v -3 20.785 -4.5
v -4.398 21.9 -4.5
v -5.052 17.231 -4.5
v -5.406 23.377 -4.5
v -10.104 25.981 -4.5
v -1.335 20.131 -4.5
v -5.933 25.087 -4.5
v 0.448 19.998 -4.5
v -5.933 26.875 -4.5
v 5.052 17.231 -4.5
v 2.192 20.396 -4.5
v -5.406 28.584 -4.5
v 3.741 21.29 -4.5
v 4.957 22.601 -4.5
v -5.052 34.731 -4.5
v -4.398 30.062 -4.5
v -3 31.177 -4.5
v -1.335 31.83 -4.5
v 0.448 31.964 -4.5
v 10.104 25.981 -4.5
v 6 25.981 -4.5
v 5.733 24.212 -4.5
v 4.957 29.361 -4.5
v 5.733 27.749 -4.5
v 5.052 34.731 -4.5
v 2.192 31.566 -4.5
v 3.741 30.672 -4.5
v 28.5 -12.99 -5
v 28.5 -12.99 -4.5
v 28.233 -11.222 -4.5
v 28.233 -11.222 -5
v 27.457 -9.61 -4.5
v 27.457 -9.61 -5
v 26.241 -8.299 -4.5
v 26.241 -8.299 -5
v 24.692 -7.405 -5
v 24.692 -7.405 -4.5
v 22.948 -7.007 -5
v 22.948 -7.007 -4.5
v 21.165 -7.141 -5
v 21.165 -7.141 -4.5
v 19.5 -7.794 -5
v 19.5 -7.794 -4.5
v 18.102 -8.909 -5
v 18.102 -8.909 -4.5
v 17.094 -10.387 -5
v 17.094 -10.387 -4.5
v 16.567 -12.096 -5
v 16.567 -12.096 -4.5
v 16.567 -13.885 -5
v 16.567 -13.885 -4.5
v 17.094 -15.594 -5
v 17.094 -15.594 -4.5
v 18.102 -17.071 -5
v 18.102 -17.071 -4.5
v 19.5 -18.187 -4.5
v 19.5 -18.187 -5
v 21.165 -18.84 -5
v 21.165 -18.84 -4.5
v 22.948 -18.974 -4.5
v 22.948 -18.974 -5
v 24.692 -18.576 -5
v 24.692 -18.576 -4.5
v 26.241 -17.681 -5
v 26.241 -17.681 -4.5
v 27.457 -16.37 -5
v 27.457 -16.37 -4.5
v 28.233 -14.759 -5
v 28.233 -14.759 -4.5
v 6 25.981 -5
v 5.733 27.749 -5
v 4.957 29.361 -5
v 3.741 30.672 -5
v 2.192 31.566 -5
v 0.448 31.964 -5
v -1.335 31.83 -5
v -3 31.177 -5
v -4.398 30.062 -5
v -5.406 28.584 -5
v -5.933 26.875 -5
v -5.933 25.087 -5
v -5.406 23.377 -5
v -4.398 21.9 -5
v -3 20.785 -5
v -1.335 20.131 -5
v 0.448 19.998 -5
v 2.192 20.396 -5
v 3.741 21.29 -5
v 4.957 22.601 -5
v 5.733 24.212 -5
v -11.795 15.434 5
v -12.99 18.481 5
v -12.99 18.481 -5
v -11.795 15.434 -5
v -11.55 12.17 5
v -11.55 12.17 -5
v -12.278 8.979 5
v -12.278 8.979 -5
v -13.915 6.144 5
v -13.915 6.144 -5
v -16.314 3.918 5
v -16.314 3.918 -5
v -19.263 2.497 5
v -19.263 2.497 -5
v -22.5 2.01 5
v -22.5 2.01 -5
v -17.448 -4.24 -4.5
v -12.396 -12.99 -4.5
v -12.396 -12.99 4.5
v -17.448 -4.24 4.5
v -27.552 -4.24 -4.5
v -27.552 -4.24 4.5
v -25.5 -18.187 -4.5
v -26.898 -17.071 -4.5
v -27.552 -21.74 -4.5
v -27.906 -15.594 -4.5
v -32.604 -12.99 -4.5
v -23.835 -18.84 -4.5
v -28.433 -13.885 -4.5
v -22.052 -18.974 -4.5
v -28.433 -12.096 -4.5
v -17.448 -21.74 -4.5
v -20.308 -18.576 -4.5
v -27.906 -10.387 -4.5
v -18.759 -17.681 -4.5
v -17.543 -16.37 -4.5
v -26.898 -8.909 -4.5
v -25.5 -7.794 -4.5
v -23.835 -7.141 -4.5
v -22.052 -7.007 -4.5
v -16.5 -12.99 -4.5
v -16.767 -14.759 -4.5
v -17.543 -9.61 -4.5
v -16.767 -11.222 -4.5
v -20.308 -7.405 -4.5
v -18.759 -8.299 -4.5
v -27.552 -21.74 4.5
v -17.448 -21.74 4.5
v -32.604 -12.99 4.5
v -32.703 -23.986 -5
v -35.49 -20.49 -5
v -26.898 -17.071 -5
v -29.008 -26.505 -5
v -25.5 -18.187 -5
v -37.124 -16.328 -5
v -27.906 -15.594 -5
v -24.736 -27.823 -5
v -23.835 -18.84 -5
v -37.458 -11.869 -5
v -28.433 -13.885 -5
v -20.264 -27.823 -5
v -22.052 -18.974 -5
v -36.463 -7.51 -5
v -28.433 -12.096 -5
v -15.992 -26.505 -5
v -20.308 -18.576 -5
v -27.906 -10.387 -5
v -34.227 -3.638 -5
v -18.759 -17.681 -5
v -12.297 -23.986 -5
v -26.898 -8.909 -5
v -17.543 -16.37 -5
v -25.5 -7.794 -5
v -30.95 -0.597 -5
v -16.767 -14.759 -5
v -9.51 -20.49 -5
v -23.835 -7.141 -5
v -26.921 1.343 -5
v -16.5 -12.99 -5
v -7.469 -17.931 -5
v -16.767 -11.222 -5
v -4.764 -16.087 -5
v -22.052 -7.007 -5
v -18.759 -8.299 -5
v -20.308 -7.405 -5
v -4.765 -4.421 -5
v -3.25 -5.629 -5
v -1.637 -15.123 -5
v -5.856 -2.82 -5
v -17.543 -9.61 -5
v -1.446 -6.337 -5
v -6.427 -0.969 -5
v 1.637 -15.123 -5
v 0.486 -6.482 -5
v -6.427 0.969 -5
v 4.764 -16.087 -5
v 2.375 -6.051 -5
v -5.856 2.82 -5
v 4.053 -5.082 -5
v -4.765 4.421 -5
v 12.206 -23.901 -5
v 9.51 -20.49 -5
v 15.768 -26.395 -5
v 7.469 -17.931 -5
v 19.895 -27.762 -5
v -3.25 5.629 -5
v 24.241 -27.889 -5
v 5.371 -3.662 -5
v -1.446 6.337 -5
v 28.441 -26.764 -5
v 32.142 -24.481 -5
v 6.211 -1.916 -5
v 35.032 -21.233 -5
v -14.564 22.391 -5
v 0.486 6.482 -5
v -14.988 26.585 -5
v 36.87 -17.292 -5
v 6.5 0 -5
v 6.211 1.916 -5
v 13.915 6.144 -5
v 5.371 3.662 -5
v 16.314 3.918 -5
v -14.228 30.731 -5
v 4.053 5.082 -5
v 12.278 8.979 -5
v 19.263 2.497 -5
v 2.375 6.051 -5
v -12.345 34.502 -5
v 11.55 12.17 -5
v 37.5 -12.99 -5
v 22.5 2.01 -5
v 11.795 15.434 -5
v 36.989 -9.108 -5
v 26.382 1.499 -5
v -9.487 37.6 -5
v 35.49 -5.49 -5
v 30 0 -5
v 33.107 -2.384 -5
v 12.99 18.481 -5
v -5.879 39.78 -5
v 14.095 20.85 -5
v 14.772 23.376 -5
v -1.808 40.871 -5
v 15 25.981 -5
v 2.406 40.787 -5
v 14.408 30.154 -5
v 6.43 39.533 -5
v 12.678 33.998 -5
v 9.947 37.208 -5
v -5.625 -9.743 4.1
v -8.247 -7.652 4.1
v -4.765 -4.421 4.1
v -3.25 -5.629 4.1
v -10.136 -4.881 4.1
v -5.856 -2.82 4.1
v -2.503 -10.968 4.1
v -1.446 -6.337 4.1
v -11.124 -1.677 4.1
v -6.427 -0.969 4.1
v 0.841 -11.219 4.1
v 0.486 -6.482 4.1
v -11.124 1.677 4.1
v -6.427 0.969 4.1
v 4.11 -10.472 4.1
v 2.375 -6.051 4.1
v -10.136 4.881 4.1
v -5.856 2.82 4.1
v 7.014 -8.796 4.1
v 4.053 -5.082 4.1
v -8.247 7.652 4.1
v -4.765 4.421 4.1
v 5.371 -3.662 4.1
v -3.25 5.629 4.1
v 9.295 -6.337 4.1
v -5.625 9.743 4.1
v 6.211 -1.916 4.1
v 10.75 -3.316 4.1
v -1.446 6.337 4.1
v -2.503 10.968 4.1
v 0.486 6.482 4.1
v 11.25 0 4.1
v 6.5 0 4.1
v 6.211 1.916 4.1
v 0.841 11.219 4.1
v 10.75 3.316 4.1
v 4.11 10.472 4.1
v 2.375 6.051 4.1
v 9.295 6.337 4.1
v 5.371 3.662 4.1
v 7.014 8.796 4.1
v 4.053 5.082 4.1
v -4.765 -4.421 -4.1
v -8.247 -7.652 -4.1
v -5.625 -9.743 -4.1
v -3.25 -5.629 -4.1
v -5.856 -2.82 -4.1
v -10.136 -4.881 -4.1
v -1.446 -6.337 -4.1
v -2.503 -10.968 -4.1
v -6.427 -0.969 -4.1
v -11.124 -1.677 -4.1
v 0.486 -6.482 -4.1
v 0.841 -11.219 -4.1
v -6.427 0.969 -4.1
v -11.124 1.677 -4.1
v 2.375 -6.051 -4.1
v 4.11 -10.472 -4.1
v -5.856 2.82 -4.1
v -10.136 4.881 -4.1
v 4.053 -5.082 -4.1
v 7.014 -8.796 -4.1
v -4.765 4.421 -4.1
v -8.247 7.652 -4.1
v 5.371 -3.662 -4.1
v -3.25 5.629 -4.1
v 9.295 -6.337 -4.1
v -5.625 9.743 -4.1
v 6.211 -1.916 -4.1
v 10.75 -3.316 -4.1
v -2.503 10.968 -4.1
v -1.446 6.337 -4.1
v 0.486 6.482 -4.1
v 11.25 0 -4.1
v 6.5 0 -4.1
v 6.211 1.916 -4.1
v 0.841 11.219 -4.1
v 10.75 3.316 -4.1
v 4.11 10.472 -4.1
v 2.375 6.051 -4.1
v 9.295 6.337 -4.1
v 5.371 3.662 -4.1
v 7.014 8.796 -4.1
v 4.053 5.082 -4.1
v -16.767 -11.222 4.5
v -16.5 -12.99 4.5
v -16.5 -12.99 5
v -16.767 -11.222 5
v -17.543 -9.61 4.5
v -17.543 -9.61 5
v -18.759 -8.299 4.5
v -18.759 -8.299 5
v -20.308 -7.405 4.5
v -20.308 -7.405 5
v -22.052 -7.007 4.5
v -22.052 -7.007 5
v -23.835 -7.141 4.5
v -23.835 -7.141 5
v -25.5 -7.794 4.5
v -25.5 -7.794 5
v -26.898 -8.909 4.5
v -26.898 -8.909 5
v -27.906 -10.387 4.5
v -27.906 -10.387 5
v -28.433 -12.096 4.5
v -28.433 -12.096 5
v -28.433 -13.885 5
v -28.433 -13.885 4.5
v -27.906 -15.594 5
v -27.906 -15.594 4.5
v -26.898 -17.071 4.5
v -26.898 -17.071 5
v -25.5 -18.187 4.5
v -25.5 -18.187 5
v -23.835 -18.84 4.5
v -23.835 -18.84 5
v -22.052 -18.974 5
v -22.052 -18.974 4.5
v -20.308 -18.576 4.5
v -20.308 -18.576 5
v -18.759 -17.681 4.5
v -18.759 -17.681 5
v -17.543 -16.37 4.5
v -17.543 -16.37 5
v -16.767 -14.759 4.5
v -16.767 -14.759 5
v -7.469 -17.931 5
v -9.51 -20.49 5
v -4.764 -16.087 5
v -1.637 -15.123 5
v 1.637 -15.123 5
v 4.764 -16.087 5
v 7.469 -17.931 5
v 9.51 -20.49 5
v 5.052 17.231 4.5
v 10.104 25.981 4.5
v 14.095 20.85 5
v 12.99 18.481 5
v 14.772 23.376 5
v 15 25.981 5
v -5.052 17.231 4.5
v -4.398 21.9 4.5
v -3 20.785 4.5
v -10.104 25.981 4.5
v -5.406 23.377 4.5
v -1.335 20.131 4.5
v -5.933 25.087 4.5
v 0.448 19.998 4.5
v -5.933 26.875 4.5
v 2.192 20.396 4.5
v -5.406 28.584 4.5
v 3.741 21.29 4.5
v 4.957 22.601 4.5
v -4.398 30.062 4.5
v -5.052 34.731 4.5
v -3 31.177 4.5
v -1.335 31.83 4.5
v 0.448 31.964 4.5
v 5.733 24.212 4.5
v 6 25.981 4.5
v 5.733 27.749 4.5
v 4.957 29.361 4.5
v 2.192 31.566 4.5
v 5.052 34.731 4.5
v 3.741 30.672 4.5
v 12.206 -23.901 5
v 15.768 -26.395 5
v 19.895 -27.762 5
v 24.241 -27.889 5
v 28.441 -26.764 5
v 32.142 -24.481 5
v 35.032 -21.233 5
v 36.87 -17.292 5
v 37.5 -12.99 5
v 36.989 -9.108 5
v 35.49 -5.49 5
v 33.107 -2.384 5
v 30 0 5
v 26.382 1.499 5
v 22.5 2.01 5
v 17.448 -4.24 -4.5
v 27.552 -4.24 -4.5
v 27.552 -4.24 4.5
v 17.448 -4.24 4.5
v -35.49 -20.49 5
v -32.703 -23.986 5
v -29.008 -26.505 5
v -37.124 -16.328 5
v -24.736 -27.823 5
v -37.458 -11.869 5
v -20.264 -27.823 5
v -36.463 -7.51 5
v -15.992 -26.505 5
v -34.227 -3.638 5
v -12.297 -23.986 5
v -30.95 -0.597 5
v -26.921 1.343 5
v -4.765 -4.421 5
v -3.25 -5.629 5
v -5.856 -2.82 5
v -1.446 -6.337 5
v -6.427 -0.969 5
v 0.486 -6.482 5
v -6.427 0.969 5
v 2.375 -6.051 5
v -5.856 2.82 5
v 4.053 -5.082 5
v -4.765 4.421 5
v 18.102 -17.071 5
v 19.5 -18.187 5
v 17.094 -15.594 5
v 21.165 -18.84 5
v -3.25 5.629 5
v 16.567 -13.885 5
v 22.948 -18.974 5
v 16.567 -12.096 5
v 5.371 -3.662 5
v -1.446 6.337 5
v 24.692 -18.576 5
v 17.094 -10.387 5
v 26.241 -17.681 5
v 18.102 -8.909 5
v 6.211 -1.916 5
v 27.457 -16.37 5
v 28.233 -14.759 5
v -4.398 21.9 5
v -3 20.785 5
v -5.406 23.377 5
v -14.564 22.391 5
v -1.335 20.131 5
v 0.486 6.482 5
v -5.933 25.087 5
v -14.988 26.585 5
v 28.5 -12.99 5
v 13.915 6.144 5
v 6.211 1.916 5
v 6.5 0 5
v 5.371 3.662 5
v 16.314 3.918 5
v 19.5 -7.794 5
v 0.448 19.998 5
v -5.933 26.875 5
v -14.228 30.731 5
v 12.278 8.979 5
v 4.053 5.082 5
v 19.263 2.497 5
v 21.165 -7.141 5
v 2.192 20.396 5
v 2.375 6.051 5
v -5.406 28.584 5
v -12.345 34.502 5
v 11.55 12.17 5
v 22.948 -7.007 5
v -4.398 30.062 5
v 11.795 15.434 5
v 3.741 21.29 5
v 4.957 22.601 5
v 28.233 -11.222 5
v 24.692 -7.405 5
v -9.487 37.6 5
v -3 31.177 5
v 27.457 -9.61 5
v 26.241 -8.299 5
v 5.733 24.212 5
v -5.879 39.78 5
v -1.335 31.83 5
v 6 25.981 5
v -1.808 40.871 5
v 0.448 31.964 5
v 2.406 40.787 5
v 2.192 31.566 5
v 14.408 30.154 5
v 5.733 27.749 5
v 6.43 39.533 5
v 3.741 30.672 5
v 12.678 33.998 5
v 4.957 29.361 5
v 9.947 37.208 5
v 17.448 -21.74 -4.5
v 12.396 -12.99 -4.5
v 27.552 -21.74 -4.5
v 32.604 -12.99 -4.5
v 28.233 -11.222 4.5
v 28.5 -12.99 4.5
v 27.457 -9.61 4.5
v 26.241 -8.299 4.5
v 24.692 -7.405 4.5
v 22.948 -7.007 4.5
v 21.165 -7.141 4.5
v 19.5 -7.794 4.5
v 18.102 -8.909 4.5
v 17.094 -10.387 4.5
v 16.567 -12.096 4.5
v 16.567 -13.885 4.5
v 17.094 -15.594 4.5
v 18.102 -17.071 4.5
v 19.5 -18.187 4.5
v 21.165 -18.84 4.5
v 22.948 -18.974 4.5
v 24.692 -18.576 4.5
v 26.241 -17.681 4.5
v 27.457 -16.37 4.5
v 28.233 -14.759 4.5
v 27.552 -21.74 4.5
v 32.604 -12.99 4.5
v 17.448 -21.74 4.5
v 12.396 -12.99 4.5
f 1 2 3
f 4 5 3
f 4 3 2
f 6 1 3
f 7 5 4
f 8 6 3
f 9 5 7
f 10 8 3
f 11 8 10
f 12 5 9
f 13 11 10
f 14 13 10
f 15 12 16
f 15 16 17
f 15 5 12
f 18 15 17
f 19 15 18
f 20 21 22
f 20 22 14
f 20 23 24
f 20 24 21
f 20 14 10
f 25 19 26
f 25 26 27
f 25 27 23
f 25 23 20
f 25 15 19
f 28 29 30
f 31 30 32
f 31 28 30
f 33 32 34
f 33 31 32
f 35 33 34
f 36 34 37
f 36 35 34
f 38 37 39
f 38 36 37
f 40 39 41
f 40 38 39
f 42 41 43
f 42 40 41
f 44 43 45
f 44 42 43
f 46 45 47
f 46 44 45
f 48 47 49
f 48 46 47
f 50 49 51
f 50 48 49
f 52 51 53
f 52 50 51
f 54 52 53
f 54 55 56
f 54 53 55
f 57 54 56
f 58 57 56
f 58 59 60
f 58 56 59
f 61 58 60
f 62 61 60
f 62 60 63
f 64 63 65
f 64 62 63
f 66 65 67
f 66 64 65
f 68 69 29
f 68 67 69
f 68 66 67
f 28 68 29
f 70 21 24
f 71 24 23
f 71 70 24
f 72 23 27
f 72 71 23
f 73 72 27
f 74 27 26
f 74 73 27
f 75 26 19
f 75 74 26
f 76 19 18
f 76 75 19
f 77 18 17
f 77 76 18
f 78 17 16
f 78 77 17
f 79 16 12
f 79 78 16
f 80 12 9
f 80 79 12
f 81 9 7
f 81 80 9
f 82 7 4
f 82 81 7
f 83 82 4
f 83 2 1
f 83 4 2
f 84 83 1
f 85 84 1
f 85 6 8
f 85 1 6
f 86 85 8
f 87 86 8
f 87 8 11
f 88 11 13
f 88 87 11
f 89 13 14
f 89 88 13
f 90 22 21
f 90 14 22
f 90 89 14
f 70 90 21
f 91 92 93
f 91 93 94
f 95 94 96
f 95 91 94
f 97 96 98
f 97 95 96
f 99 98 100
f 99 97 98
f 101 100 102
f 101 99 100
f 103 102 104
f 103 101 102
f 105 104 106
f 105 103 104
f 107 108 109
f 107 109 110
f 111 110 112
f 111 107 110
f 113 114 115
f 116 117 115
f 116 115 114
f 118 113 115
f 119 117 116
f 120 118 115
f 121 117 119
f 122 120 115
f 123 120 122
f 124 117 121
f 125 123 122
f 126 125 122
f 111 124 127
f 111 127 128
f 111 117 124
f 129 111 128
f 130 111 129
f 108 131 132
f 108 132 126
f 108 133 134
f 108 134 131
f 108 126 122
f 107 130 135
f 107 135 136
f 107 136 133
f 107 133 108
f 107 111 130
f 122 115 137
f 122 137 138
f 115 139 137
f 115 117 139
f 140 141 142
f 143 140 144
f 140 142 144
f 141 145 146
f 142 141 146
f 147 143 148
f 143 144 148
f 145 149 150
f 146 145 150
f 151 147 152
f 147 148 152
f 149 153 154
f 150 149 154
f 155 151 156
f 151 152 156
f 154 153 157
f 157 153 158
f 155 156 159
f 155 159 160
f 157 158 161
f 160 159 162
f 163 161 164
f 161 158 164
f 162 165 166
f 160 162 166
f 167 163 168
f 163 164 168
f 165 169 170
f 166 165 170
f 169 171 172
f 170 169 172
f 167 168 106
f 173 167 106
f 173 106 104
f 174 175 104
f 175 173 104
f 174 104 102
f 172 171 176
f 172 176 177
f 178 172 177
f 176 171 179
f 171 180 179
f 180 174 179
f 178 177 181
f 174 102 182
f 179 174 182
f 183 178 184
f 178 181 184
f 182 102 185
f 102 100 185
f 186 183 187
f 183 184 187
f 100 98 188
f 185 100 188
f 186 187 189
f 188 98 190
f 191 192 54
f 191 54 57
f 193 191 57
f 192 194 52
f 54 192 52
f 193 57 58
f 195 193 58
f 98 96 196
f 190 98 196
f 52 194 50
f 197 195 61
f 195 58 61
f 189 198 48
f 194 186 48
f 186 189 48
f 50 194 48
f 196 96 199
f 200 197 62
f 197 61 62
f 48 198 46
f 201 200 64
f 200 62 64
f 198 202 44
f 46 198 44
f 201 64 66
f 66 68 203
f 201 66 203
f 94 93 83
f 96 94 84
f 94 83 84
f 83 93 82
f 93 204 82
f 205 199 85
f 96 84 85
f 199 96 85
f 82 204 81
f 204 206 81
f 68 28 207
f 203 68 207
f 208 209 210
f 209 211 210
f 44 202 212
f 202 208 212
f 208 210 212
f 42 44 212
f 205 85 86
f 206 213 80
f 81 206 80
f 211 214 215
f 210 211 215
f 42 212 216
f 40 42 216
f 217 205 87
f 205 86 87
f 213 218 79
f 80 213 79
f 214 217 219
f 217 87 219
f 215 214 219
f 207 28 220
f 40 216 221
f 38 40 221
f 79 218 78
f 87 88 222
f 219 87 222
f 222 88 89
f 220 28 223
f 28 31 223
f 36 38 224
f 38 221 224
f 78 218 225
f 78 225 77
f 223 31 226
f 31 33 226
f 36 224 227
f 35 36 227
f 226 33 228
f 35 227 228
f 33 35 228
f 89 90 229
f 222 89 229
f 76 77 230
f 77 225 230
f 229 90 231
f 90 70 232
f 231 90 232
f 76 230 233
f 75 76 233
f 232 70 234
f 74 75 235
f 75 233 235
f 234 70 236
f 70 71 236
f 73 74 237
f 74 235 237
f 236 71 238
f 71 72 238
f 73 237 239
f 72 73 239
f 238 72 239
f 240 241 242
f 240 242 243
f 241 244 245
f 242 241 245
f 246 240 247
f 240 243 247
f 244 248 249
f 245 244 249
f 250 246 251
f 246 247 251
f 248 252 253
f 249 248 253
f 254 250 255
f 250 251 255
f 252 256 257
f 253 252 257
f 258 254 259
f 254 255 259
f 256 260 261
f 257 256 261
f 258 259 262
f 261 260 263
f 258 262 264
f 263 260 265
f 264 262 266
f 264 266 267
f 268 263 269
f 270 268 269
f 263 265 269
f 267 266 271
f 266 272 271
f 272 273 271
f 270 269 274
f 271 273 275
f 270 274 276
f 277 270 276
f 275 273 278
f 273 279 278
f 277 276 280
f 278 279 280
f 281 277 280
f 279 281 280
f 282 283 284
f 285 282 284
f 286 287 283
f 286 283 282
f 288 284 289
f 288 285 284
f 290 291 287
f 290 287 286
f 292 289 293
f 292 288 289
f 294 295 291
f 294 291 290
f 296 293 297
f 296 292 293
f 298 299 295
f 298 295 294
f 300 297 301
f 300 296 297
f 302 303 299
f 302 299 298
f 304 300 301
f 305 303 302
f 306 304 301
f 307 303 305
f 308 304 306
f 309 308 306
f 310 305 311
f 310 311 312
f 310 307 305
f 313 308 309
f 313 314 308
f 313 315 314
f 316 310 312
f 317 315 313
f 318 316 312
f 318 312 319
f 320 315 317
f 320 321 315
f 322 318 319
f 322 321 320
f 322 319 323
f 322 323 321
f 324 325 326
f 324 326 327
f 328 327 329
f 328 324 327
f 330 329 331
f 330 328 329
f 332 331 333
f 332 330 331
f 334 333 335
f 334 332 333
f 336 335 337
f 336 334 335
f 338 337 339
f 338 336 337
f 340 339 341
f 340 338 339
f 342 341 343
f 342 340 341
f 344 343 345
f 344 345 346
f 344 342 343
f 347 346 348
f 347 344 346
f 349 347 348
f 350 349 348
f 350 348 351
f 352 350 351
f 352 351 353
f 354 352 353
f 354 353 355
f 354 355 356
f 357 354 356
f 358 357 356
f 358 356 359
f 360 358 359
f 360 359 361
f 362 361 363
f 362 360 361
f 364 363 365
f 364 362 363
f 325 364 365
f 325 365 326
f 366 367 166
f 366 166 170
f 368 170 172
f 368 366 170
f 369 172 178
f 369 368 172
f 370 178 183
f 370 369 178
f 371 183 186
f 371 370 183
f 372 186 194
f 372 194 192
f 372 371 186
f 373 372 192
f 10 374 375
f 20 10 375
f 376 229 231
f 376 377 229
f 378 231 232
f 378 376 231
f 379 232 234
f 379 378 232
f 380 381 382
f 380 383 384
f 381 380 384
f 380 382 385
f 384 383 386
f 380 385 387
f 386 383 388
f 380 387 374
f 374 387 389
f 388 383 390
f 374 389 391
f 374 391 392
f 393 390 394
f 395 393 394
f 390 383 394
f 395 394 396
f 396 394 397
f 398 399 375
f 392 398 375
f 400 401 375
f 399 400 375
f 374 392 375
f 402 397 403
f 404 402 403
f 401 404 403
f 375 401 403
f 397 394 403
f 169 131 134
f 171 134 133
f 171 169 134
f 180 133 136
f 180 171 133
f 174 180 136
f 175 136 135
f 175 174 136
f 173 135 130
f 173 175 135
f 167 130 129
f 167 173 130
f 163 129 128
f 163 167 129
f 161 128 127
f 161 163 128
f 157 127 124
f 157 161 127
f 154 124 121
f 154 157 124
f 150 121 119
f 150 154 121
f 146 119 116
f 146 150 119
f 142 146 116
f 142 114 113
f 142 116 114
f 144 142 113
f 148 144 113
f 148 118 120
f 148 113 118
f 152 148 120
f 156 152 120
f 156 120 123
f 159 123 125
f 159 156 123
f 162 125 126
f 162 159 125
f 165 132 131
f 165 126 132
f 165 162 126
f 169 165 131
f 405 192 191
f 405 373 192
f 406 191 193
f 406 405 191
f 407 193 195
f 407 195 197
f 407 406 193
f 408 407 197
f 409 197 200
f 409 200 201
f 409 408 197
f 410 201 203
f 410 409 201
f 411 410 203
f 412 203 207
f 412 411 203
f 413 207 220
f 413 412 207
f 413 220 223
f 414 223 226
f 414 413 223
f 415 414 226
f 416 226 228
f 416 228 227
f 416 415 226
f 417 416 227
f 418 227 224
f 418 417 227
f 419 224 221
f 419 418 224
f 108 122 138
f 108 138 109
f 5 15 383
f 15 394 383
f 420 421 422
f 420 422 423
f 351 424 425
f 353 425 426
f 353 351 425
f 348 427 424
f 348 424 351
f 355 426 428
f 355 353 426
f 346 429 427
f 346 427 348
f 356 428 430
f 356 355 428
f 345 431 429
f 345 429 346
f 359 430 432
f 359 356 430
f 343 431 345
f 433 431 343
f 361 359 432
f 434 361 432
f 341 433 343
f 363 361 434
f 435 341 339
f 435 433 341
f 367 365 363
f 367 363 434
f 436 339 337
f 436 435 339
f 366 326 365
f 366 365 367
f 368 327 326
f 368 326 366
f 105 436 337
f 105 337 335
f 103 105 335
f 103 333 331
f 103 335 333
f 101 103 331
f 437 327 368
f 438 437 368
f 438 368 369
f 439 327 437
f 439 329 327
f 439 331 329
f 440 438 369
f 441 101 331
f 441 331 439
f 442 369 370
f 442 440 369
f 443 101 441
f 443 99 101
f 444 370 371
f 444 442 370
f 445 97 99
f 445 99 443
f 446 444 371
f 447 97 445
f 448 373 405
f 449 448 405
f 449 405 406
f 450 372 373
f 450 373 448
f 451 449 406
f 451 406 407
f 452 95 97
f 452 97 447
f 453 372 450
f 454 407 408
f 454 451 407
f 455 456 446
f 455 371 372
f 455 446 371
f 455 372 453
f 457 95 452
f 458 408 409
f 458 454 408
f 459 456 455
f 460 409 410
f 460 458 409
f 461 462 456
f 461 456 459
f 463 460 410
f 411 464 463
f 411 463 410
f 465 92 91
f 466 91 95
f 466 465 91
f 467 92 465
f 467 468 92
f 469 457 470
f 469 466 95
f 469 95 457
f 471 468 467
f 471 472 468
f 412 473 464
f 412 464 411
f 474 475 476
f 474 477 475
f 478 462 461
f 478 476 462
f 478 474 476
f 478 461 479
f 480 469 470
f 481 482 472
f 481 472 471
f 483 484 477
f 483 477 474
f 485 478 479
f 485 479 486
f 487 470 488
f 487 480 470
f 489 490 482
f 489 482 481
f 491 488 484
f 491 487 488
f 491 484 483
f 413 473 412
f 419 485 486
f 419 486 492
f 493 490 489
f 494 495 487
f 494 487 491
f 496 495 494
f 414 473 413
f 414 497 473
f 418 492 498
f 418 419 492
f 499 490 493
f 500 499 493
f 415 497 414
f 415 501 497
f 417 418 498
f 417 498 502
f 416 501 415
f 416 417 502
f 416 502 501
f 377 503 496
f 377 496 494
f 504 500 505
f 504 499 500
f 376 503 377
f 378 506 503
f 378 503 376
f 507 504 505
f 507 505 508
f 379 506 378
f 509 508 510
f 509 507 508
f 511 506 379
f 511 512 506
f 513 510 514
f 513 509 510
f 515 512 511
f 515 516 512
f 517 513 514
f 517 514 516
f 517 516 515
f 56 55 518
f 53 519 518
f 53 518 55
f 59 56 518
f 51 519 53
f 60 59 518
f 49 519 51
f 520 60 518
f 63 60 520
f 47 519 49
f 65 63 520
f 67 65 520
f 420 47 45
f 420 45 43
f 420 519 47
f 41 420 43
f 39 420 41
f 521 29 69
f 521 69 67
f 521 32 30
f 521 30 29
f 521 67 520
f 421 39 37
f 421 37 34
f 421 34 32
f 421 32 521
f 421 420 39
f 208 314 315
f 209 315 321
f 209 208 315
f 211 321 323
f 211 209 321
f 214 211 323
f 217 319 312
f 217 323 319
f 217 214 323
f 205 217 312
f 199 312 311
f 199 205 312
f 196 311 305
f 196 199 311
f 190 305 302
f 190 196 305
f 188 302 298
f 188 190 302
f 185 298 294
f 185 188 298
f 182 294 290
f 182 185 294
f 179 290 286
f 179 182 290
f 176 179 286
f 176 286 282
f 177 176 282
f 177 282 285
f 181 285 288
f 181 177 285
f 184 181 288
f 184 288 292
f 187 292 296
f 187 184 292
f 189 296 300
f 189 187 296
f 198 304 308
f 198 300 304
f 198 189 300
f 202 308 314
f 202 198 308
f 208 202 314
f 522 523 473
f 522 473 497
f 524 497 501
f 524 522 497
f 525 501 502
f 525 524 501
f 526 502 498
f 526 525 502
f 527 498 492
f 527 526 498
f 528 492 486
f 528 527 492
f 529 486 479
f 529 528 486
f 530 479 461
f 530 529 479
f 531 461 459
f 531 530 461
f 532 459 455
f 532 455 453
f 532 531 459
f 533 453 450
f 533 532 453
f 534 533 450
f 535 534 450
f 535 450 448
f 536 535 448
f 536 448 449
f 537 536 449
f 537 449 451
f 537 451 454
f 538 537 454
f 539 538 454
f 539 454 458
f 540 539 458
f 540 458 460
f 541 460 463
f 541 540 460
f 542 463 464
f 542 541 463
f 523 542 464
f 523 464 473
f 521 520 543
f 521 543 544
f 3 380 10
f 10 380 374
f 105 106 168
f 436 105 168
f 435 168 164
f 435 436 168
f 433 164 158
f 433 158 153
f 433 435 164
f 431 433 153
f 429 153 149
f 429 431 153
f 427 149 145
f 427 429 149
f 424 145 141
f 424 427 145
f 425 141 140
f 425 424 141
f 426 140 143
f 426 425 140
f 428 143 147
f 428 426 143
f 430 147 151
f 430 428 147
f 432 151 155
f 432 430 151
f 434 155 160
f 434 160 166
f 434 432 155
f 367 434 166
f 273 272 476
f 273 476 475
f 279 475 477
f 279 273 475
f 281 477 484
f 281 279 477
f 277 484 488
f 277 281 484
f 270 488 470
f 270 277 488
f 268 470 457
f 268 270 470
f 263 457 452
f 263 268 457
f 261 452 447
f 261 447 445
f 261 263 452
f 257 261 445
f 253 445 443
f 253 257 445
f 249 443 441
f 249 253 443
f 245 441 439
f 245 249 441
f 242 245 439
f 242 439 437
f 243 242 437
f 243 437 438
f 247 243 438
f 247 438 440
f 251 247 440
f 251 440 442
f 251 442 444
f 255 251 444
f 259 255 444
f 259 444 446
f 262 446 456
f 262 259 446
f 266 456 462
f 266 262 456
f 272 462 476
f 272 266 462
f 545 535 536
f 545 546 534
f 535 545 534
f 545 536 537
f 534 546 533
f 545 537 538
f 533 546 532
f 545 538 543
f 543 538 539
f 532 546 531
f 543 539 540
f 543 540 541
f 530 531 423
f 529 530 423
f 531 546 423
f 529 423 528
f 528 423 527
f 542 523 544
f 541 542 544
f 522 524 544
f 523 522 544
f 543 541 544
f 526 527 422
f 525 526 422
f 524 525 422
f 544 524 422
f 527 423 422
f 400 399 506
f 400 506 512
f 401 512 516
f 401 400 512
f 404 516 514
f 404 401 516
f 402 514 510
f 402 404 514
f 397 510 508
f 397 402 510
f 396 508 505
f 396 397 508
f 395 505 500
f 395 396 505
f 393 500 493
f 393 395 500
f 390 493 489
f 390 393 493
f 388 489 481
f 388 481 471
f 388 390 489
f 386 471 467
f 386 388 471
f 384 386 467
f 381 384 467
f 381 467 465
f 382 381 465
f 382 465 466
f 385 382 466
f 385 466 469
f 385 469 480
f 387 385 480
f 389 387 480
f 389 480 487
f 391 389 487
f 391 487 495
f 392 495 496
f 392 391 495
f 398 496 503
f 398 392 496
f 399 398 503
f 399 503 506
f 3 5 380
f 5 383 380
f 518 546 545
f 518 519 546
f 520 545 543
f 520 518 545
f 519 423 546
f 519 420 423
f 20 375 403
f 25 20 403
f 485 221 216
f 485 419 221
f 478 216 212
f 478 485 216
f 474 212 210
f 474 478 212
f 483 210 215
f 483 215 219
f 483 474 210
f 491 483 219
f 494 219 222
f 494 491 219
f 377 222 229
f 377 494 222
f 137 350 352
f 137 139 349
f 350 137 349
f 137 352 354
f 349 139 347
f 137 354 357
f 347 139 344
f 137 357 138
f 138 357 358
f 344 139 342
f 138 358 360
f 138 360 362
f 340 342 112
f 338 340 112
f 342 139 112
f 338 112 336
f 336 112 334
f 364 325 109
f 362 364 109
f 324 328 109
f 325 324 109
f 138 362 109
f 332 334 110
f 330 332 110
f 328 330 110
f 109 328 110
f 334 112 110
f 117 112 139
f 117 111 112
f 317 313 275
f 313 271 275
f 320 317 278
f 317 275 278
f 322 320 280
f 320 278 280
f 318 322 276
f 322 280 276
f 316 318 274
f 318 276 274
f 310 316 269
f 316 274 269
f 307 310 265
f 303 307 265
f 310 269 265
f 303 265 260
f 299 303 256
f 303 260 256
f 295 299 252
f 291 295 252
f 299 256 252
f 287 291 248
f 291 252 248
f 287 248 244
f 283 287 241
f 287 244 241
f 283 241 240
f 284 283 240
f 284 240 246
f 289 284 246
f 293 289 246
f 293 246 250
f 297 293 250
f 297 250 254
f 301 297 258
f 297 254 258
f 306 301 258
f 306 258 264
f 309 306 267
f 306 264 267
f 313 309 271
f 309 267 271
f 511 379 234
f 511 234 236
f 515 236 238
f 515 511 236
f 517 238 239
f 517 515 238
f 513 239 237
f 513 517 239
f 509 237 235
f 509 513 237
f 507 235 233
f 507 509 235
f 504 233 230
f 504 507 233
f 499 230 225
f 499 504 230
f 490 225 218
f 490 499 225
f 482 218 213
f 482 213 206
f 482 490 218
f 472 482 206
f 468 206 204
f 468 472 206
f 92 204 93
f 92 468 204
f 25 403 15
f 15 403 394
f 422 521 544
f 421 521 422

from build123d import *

# Parameters (mm, degrees)
F0_R     = 6
F0_R_2   = 6.5
F1_DEPTH = 5
F2_R     = 11.25
F3_DEPTH = 4.1
F5_DEPTH = 4.5


with BuildPart() as f1:
    # F0 (on Top) → F1 (new body, symmetric)
    with BuildSketch(Plane.XY):
        with BuildLine():
            ThreePointArc((12.990381, 18.480762), (14.488887, 22.098476), (15, 25.980762))
            ThreePointArc((15, 25.980762), (-3.882286, 40.46965), (-12.990381, 18.480762))
            ThreePointArc((-12.990381, 18.480762), (0, 10.980762), (12.990381, 18.480762))
        make_face()
        with Locations((0, 25.980762)):
            Circle(F0_R, mode=Mode.SUBTRACT)
        with BuildLine():
            ThreePointArc((12.990381, 18.480762), (0, 10.980762), (-12.990381, 18.480762))
            ThreePointArc((-12.990381, 18.480762), (-12.990381, 7.5), (-22.5, 2.009619))
            ThreePointArc((-22.5, 2.009619), (-11.893398, -2.383779), (-7.5, -12.990381))
            ThreePointArc((-7.5, -12.990381), (-8.011113, -16.872667), (-9.509619, -20.490381))
            ThreePointArc((-9.509619, -20.490381), (0, -15), (9.509619, -20.490381))
            ThreePointArc((9.509619, -20.490381), (9.509619, -5.490381), (22.5, 2.009619))
            ThreePointArc((22.5, 2.009619), (12.990381, 7.5), (12.990381, 18.480762))
        make_face()
        Circle(F0_R_2, mode=Mode.SUBTRACT)
        with BuildLine():
            ThreePointArc((-7.5, -12.990381), (-11.893398, -2.383779), (-22.5, 2.009619))
            ThreePointArc((-22.5, 2.009619), (-35.490381, -20.490381), (-9.509619, -20.490381))
            ThreePointArc((-9.509619, -20.490381), (-8.011113, -16.872667), (-7.5, -12.990381))
        make_face()
        with Locations((-22.5, -12.990381)):
            Circle(F0_R, mode=Mode.SUBTRACT)
        with BuildLine():
            ThreePointArc((37.5, -12.990381), (33.106602, -2.383779), (22.5, 2.009619))
            ThreePointArc((22.5, 2.009619), (9.509619, -5.490381), (9.509619, -20.490381))
            ThreePointArc((9.509619, -20.490381), (26.382286, -27.479268), (37.5, -12.990381))
        make_face()
        with Locations((22.5, -12.990381)):
            Circle(F0_R, mode=Mode.SUBTRACT)
    extrude(amount=F1_DEPTH, both=True)

    # F2 (on Top) → F3 (cut, symmetric)
    with BuildSketch(Plane.XY):
        Circle(F2_R)
    extrude(amount=F3_DEPTH, both=True, mode=Mode.SUBTRACT)

    # F4 (on Top) → F5 (cut, symmetric)
    with BuildSketch(Plane.XY):
        Polygon((27.551815, -4.240381), (17.448185, -4.240381), (12.39637, -12.990381), (17.448185, -21.740381), (27.551815, -21.740381), (32.60363, -12.990381), align=None)
        Polygon((-12.39637, -12.990381), (-17.448185, -4.240381), (-27.551815, -4.240381), (-32.60363, -12.990381), (-27.551815, -21.740381), (-17.448185, -21.740381), align=None)
        Polygon((-5.051815, 17.230762), (5.051815, 17.230762), (10.10363, 25.980762), (5.051815, 34.730762), (-5.051815, 34.730762), (-10.10363, 25.980762), align=None)
    extrude(amount=F5_DEPTH, both=True, mode=Mode.SUBTRACT)


solid = f1.part
